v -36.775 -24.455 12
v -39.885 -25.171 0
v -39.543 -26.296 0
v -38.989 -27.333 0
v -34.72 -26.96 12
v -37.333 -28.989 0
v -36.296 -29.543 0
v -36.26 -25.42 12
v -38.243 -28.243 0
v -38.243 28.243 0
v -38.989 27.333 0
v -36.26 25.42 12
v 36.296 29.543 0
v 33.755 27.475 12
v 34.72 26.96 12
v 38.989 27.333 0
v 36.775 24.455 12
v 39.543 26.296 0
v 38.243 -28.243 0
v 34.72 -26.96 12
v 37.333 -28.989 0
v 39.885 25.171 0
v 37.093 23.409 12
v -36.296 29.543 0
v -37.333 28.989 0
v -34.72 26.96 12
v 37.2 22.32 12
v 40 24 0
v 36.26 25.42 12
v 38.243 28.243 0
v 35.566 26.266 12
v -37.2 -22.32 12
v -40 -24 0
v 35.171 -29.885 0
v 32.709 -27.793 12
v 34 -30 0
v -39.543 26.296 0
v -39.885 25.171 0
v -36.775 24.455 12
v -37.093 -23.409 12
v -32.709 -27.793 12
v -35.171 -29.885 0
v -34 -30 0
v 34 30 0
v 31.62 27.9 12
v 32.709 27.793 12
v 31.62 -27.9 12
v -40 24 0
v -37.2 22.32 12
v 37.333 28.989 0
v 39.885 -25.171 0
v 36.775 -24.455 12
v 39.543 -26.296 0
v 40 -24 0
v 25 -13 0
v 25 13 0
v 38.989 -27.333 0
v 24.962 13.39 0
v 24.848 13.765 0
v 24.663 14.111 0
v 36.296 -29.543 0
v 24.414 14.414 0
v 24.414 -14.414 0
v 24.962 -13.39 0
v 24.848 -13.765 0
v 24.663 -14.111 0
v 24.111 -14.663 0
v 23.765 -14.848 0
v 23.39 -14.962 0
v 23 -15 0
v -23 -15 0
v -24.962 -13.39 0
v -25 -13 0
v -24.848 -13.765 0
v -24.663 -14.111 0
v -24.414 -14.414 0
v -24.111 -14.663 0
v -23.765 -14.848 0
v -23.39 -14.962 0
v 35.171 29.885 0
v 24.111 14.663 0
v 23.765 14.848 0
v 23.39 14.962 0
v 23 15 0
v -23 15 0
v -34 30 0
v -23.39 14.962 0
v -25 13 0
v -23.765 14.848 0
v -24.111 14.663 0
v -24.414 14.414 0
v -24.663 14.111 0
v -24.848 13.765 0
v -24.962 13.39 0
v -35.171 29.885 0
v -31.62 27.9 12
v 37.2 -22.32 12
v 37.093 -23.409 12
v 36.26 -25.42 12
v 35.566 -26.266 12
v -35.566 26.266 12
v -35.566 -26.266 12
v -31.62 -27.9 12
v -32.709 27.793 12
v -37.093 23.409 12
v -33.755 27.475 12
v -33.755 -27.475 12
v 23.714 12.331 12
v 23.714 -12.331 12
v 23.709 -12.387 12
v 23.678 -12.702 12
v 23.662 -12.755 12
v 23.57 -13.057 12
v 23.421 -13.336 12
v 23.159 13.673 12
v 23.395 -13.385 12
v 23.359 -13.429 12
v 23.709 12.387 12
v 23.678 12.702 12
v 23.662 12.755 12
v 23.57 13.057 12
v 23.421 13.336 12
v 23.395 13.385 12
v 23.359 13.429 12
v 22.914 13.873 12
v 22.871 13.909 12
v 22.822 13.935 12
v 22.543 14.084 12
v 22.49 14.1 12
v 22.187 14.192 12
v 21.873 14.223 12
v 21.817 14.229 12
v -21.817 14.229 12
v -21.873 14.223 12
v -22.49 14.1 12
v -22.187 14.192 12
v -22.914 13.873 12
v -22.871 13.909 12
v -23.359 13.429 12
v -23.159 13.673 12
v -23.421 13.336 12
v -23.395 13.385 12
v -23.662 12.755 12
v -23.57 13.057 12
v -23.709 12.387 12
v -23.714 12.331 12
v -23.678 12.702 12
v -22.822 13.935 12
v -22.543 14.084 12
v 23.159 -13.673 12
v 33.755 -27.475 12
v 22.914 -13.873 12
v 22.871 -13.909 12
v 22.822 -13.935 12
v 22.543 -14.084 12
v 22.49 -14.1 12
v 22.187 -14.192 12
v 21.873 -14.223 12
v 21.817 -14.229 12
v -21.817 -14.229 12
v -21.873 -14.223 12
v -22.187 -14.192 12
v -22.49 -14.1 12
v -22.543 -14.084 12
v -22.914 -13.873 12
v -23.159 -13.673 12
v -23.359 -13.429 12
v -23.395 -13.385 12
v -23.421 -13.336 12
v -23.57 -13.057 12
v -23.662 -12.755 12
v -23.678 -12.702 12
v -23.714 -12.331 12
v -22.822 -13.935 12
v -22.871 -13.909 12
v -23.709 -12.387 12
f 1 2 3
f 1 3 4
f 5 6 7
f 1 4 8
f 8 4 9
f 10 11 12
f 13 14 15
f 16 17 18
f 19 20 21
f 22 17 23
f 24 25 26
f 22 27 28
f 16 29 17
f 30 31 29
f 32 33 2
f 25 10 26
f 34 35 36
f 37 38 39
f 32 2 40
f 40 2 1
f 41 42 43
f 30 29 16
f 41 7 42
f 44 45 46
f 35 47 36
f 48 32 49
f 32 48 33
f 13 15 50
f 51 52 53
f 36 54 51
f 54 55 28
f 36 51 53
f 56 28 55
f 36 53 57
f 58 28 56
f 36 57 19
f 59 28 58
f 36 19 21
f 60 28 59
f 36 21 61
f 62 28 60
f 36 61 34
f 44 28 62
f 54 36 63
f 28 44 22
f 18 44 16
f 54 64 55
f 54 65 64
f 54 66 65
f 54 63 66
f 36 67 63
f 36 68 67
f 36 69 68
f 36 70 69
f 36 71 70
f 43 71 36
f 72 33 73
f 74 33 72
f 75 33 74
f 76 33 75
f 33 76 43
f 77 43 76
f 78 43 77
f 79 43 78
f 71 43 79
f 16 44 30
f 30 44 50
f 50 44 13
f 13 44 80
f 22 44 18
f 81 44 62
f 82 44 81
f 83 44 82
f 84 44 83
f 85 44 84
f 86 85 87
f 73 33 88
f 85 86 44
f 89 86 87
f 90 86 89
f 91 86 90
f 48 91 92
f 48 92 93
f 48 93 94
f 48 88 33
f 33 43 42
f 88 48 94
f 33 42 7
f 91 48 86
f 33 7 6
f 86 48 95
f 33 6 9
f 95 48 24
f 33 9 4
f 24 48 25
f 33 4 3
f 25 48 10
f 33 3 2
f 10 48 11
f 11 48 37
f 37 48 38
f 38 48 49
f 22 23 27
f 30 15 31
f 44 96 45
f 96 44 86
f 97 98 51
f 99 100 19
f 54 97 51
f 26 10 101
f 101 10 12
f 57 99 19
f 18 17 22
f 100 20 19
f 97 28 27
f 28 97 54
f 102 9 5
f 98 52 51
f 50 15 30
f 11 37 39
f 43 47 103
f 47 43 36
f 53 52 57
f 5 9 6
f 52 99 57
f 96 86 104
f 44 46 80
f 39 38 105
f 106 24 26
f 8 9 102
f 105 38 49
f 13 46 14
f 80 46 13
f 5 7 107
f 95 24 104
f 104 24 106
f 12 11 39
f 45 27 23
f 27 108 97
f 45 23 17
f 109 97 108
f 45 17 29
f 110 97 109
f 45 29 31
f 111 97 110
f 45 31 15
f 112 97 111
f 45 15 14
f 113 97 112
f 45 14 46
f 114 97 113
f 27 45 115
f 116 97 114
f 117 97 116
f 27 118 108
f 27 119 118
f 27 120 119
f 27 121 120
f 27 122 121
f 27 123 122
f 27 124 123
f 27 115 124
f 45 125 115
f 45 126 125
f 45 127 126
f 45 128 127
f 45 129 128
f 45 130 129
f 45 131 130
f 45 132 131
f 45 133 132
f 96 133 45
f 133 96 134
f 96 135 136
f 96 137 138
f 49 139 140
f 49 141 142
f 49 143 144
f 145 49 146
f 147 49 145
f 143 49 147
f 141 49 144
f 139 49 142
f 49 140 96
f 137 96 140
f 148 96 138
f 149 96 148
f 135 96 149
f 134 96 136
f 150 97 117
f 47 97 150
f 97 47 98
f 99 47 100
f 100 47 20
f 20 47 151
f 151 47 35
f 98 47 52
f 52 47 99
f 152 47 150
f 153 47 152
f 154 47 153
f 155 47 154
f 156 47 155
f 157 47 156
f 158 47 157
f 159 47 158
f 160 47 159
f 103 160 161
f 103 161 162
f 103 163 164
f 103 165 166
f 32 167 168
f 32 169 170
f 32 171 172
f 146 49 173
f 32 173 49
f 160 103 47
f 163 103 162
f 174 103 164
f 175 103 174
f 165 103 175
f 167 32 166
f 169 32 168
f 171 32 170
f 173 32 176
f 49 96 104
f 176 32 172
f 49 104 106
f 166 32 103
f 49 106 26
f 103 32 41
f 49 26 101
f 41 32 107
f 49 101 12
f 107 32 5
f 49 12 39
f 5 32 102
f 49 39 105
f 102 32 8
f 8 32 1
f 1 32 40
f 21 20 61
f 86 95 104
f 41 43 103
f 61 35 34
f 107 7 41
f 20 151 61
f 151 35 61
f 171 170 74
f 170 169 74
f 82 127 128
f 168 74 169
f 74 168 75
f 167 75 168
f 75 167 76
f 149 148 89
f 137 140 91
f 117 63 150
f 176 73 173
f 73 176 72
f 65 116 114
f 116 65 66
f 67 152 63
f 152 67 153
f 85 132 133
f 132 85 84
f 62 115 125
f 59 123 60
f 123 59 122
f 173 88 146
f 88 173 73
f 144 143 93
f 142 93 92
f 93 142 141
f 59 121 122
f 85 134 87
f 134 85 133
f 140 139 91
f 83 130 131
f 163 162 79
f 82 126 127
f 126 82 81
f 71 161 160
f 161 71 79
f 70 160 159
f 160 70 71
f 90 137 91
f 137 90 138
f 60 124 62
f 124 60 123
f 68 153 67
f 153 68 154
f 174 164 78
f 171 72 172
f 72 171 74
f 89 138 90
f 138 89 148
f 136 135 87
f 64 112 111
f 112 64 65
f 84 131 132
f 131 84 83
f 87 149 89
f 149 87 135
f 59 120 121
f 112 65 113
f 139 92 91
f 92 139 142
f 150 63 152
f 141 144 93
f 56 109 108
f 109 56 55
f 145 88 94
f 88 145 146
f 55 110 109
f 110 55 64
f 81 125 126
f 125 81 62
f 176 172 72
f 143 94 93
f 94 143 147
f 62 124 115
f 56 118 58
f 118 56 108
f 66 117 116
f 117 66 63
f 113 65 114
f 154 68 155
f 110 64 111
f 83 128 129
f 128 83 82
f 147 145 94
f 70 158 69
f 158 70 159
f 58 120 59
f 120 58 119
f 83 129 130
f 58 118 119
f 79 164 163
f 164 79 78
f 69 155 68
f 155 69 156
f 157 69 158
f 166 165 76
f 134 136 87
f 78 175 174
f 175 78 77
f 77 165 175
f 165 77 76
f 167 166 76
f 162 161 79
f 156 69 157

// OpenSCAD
$fn = 32;

// ----------------------------------------------------------------------
// Display bezel: 80 x 60 mm frame, opening 50x30 mm
// ----------------------------------------------------------------------

// --- parameters (mm) ---
length = 80;              // frame outside length, X
width = 60;               // frame outside width, Y
frame_w = 15;             // frame width
thickness = 12;           // frame thickness
corner_r = 6;             // outside corner radius
chamfer = 0.93;           // outer wall taper
funnel = 0.94;            // inner opening taper
opening_l = 50;           // opening length
opening_w = 30;           // opening width
inner_r = 2;              // opening corner radius

/* rounded-rectangle outlines, generated with loops */
module rounded_ring(l_nom, w_nom, r) {
  hull() {
    for (sx = [-1, 1]) for (sy = [-1, 1])
      translate([sx * (l_nom / 2 - r), sy * (w_nom / 2 - r)]) circle(r = r);
  }
}

difference() {
  /* frame body, drafted so the outer edge is a variable-depth chamfer */
  linear_extrude(height = thickness, scale = chamfer)
    rounded_ring(length, width, corner_r);
  /* viewing opening, drafted the other way for a funnel edge */
  linear_extrude(height = thickness + 2, scale = funnel)
    translate([0, 0, -1]) rounded_ring(opening_l, opening_w, inner_r);
}
